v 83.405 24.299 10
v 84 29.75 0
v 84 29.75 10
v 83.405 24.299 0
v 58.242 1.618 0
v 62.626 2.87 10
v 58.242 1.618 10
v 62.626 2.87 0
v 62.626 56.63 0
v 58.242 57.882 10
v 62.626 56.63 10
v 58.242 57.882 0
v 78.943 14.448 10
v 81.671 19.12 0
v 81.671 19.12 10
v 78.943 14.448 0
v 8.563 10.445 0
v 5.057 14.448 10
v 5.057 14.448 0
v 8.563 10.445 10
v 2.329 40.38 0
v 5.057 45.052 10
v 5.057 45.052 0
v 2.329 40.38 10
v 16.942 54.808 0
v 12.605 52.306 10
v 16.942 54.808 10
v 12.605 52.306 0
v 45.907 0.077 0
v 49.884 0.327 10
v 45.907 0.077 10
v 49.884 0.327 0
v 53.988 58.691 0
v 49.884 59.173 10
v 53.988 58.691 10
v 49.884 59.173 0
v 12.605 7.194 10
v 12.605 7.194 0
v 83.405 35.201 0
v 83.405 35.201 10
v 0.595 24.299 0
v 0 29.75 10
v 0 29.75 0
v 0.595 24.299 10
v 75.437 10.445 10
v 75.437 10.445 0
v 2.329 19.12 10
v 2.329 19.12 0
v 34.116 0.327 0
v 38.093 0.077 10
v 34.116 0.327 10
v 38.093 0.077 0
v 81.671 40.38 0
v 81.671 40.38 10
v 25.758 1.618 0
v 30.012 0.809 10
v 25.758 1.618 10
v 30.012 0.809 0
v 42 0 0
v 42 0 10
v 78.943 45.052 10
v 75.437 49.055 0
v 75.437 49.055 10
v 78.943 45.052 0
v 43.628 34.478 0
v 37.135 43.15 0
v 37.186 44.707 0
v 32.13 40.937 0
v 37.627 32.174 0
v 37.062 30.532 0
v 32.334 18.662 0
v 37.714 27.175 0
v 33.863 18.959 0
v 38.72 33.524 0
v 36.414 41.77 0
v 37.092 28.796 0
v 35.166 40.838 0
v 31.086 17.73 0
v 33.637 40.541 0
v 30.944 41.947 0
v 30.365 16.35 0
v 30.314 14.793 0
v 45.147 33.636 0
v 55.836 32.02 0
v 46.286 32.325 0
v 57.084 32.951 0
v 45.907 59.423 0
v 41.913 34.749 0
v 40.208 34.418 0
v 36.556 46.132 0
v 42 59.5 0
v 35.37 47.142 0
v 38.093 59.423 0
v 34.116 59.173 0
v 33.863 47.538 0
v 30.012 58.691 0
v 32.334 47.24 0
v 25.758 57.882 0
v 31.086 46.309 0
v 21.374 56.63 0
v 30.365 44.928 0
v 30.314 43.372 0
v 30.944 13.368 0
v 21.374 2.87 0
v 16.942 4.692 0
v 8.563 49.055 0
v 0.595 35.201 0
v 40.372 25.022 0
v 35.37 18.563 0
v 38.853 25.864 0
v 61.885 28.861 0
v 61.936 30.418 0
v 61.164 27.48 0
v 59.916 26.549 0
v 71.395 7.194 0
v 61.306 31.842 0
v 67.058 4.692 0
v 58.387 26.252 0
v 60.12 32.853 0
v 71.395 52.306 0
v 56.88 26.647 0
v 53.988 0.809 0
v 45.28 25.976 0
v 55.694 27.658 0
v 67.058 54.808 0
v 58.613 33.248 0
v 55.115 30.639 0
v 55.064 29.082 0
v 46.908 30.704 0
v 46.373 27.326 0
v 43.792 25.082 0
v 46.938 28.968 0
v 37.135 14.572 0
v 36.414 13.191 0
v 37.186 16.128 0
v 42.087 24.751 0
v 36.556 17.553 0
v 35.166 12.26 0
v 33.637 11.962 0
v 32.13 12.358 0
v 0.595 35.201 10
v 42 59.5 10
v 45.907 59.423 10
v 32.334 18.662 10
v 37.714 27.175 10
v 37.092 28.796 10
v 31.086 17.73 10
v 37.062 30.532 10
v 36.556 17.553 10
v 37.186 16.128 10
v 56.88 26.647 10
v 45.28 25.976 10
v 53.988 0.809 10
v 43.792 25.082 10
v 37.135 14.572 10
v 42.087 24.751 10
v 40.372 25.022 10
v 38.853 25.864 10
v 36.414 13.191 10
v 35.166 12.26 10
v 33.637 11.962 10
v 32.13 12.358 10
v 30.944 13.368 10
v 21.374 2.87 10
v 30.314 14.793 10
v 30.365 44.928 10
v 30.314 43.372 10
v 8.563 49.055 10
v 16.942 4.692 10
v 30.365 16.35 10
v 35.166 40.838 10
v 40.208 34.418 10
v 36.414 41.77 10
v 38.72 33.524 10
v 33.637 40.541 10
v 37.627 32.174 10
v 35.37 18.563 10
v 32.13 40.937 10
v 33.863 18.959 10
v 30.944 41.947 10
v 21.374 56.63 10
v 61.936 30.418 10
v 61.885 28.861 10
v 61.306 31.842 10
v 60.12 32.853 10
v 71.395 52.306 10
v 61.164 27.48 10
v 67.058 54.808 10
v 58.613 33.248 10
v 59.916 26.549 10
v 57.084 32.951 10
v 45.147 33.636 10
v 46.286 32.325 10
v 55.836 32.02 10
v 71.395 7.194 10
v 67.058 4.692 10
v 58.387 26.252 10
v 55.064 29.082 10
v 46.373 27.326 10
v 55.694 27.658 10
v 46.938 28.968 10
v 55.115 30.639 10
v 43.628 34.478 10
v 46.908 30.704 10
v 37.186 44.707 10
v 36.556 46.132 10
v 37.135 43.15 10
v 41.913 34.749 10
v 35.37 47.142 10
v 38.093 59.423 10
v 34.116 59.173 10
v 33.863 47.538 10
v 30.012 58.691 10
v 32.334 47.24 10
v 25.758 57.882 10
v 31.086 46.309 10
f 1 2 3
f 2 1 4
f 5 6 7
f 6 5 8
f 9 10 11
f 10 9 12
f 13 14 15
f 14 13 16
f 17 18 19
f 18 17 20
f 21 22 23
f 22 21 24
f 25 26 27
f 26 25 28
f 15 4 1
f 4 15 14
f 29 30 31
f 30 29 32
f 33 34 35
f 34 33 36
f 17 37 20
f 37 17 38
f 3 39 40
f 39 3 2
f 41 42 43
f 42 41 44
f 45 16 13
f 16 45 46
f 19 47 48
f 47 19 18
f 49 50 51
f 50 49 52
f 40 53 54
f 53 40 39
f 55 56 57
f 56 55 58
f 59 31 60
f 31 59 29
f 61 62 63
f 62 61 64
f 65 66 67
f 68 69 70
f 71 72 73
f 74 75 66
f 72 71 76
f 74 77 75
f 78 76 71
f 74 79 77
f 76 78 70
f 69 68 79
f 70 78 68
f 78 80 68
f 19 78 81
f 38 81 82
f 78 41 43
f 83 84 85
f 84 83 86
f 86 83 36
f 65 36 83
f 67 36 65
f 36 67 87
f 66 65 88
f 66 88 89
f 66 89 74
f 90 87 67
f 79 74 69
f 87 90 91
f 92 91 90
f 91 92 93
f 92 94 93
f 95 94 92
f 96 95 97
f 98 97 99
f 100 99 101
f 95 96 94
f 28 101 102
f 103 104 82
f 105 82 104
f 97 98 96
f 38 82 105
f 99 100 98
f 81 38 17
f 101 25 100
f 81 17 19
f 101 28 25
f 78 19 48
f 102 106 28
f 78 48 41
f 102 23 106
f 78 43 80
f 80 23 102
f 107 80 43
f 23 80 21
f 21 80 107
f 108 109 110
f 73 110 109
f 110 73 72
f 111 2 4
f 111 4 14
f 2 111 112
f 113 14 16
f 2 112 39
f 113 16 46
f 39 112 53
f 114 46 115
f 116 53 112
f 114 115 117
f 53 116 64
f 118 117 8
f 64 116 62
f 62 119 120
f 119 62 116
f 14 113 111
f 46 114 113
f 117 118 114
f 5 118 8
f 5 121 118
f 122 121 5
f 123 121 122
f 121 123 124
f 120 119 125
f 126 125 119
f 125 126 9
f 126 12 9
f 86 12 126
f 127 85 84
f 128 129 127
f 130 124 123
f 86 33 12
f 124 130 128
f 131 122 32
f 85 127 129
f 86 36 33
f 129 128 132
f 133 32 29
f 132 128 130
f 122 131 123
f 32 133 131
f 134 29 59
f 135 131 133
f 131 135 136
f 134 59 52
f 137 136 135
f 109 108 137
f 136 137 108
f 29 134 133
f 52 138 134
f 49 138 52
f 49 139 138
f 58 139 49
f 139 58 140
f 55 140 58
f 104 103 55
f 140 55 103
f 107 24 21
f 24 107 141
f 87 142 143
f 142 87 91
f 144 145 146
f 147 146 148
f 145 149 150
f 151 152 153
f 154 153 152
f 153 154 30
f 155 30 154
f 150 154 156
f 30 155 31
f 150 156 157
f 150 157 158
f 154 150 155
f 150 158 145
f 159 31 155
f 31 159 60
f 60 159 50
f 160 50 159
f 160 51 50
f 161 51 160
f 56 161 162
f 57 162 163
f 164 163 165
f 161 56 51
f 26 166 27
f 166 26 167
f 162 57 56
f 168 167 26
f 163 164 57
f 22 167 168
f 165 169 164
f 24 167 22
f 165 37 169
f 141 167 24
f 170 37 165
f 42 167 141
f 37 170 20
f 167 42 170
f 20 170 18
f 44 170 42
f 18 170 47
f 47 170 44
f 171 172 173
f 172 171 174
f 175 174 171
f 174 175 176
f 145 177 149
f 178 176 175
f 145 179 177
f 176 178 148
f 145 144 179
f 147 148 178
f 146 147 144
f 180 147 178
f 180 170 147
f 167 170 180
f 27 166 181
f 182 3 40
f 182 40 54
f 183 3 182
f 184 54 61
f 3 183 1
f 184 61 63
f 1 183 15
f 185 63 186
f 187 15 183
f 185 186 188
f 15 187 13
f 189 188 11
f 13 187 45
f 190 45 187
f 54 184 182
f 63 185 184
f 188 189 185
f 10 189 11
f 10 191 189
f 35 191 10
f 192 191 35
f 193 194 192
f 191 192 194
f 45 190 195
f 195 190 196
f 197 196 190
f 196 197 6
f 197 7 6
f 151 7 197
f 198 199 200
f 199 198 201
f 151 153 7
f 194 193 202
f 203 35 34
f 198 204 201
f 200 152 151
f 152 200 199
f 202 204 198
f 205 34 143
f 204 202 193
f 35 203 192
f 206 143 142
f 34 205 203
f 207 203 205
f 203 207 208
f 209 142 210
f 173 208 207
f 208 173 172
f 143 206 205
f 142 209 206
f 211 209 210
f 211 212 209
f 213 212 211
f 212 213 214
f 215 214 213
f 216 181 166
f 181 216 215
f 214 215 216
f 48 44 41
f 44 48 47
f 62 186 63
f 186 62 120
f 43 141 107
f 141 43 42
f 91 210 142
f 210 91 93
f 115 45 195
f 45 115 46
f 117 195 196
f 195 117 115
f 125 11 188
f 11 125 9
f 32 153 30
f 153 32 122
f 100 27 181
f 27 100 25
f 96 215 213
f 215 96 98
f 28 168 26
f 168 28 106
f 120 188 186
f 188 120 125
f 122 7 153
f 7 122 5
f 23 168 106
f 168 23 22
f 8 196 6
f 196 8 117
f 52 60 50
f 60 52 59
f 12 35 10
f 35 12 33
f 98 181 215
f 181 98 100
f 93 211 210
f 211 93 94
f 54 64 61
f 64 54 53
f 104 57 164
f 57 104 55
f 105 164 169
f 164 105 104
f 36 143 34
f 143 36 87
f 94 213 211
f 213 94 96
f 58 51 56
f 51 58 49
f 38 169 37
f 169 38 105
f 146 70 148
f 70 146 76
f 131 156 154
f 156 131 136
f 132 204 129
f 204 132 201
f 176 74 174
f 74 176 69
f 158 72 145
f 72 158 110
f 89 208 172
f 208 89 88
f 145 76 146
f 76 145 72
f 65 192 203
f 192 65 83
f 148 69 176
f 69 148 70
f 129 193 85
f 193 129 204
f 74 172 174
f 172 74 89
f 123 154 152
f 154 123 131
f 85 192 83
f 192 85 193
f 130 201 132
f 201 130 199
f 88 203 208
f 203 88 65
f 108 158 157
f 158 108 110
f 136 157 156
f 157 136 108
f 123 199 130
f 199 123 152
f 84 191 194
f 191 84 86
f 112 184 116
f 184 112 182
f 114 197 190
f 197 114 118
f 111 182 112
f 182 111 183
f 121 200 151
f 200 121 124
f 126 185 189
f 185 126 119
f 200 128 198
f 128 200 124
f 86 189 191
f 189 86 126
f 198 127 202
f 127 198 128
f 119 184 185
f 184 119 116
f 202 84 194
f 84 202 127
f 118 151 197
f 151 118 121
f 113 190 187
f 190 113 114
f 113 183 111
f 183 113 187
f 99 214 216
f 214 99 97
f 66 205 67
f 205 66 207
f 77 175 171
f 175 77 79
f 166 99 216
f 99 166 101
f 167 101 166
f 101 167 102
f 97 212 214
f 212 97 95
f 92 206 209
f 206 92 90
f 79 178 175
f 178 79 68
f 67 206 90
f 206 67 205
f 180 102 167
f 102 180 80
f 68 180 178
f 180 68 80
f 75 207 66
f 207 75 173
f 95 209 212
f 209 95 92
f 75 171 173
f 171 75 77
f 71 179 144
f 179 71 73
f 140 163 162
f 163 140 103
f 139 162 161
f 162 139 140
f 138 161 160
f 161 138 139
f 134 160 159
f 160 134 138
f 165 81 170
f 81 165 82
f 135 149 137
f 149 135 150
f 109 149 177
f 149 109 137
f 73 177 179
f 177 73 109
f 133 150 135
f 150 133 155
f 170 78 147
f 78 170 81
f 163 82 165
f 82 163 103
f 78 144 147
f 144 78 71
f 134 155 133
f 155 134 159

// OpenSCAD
$fn = 32;

// ----------------------------------------------------------------------
// Cam plate: double_lobe cam, base R28
// ----------------------------------------------------------------------

// --- parameters (mm) ---
base_r = 28;              // base circle radius
lobe_h = 14;              // cam lobe rise
bore_r = 5;               // shaft bore radius
plate_t = 10;             // plate thickness, Z (extrusion height)
ring_r = 16.5;            // lightening ring radius
bolt_r = 3.5;             // lightening hole radius
fit_tol = 0.05;           // declared fit tolerance (prompt contract)
free_tol = 0.2;           // declared free tolerance (prompt contract)

profile = [[84, 29.75], [83.405, 35.201], [81.671, 40.38], [78.943, 45.052], [75.437, 49.055], [71.395, 52.306], [67.058, 54.808], [62.626, 56.63], [58.242, 57.882], [53.988, 58.691], [49.884, 59.173], [45.907, 59.423], [42, 59.5], [38.093, 59.423], [34.116, 59.173], [30.012, 58.691], [25.758, 57.882], [21.374, 56.63], [16.942, 54.808], [12.605, 52.306], [8.563, 49.055], [5.057, 45.052], [2.329, 40.38], [0.595, 35.201], [0, 29.75], [0.595, 24.299], [2.329, 19.12], [5.057, 14.448], [8.563, 10.445], [12.605, 7.194], [16.942, 4.692], [21.374, 2.87], [25.758, 1.618], [30.012, 0.809], [34.116, 0.327], [38.093, 0.077], [42, 0], [45.907, 0.077], [49.884, 0.327], [53.988, 0.809], [58.242, 1.618], [62.626, 2.87], [67.058, 4.692], [71.395, 7.194], [75.437, 10.445], [78.943, 14.448], [81.671, 19.12], [83.405, 24.299]];  // primary outline, 48 points, counter clockwise
void_1 = [[46.908, 30.704], [46.286, 32.325], [45.147, 33.636], [43.628, 34.478], [41.913, 34.749], [40.208, 34.418], [38.72, 33.524], [37.627, 32.174], [37.062, 30.532], [37.092, 28.796], [37.714, 27.175], [38.853, 25.864], [40.372, 25.022], [42.087, 24.751], [43.792, 25.082], [45.28, 25.976], [46.373, 27.326], [46.938, 28.968]];  // shaft bore, 18 points
void_2 = [[61.936, 30.418], [61.306, 31.842], [60.12, 32.853], [58.613, 33.248], [57.084, 32.951], [55.836, 32.02], [55.115, 30.639], [55.064, 29.082], [55.694, 27.658], [56.88, 26.647], [58.387, 26.252], [59.916, 26.549], [61.164, 27.48], [61.885, 28.861]];  // lightening hole 1, 14 points
void_3 = [[37.186, 44.707], [36.556, 46.132], [35.37, 47.142], [33.863, 47.538], [32.334, 47.24], [31.086, 46.309], [30.365, 44.928], [30.314, 43.372], [30.944, 41.947], [32.13, 40.937], [33.637, 40.541], [35.166, 40.838], [36.414, 41.77], [37.135, 43.15]];  // lightening hole 2, 14 points
void_4 = [[37.186, 16.128], [36.556, 17.553], [35.37, 18.563], [33.863, 18.959], [32.334, 18.662], [31.086, 17.73], [30.365, 16.35], [30.314, 14.793], [30.944, 13.368], [32.13, 12.358], [33.637, 11.962], [35.166, 12.26], [36.414, 13.191], [37.135, 14.572]];  // lightening hole 3, 14 points

// --- the one profile operation ---
difference() {
  linear_extrude(height = plate_t) polygon(points = profile);
  translate([0, 0, -1])
    linear_extrude(height = plate_t + 2) polygon(points = void_1);
  translate([0, 0, -1])
    linear_extrude(height = plate_t + 2) polygon(points = void_2);
  translate([0, 0, -1])
    linear_extrude(height = plate_t + 2) polygon(points = void_3);
  translate([0, 0, -1])
    linear_extrude(height = plate_t + 2) polygon(points = void_4);
}
